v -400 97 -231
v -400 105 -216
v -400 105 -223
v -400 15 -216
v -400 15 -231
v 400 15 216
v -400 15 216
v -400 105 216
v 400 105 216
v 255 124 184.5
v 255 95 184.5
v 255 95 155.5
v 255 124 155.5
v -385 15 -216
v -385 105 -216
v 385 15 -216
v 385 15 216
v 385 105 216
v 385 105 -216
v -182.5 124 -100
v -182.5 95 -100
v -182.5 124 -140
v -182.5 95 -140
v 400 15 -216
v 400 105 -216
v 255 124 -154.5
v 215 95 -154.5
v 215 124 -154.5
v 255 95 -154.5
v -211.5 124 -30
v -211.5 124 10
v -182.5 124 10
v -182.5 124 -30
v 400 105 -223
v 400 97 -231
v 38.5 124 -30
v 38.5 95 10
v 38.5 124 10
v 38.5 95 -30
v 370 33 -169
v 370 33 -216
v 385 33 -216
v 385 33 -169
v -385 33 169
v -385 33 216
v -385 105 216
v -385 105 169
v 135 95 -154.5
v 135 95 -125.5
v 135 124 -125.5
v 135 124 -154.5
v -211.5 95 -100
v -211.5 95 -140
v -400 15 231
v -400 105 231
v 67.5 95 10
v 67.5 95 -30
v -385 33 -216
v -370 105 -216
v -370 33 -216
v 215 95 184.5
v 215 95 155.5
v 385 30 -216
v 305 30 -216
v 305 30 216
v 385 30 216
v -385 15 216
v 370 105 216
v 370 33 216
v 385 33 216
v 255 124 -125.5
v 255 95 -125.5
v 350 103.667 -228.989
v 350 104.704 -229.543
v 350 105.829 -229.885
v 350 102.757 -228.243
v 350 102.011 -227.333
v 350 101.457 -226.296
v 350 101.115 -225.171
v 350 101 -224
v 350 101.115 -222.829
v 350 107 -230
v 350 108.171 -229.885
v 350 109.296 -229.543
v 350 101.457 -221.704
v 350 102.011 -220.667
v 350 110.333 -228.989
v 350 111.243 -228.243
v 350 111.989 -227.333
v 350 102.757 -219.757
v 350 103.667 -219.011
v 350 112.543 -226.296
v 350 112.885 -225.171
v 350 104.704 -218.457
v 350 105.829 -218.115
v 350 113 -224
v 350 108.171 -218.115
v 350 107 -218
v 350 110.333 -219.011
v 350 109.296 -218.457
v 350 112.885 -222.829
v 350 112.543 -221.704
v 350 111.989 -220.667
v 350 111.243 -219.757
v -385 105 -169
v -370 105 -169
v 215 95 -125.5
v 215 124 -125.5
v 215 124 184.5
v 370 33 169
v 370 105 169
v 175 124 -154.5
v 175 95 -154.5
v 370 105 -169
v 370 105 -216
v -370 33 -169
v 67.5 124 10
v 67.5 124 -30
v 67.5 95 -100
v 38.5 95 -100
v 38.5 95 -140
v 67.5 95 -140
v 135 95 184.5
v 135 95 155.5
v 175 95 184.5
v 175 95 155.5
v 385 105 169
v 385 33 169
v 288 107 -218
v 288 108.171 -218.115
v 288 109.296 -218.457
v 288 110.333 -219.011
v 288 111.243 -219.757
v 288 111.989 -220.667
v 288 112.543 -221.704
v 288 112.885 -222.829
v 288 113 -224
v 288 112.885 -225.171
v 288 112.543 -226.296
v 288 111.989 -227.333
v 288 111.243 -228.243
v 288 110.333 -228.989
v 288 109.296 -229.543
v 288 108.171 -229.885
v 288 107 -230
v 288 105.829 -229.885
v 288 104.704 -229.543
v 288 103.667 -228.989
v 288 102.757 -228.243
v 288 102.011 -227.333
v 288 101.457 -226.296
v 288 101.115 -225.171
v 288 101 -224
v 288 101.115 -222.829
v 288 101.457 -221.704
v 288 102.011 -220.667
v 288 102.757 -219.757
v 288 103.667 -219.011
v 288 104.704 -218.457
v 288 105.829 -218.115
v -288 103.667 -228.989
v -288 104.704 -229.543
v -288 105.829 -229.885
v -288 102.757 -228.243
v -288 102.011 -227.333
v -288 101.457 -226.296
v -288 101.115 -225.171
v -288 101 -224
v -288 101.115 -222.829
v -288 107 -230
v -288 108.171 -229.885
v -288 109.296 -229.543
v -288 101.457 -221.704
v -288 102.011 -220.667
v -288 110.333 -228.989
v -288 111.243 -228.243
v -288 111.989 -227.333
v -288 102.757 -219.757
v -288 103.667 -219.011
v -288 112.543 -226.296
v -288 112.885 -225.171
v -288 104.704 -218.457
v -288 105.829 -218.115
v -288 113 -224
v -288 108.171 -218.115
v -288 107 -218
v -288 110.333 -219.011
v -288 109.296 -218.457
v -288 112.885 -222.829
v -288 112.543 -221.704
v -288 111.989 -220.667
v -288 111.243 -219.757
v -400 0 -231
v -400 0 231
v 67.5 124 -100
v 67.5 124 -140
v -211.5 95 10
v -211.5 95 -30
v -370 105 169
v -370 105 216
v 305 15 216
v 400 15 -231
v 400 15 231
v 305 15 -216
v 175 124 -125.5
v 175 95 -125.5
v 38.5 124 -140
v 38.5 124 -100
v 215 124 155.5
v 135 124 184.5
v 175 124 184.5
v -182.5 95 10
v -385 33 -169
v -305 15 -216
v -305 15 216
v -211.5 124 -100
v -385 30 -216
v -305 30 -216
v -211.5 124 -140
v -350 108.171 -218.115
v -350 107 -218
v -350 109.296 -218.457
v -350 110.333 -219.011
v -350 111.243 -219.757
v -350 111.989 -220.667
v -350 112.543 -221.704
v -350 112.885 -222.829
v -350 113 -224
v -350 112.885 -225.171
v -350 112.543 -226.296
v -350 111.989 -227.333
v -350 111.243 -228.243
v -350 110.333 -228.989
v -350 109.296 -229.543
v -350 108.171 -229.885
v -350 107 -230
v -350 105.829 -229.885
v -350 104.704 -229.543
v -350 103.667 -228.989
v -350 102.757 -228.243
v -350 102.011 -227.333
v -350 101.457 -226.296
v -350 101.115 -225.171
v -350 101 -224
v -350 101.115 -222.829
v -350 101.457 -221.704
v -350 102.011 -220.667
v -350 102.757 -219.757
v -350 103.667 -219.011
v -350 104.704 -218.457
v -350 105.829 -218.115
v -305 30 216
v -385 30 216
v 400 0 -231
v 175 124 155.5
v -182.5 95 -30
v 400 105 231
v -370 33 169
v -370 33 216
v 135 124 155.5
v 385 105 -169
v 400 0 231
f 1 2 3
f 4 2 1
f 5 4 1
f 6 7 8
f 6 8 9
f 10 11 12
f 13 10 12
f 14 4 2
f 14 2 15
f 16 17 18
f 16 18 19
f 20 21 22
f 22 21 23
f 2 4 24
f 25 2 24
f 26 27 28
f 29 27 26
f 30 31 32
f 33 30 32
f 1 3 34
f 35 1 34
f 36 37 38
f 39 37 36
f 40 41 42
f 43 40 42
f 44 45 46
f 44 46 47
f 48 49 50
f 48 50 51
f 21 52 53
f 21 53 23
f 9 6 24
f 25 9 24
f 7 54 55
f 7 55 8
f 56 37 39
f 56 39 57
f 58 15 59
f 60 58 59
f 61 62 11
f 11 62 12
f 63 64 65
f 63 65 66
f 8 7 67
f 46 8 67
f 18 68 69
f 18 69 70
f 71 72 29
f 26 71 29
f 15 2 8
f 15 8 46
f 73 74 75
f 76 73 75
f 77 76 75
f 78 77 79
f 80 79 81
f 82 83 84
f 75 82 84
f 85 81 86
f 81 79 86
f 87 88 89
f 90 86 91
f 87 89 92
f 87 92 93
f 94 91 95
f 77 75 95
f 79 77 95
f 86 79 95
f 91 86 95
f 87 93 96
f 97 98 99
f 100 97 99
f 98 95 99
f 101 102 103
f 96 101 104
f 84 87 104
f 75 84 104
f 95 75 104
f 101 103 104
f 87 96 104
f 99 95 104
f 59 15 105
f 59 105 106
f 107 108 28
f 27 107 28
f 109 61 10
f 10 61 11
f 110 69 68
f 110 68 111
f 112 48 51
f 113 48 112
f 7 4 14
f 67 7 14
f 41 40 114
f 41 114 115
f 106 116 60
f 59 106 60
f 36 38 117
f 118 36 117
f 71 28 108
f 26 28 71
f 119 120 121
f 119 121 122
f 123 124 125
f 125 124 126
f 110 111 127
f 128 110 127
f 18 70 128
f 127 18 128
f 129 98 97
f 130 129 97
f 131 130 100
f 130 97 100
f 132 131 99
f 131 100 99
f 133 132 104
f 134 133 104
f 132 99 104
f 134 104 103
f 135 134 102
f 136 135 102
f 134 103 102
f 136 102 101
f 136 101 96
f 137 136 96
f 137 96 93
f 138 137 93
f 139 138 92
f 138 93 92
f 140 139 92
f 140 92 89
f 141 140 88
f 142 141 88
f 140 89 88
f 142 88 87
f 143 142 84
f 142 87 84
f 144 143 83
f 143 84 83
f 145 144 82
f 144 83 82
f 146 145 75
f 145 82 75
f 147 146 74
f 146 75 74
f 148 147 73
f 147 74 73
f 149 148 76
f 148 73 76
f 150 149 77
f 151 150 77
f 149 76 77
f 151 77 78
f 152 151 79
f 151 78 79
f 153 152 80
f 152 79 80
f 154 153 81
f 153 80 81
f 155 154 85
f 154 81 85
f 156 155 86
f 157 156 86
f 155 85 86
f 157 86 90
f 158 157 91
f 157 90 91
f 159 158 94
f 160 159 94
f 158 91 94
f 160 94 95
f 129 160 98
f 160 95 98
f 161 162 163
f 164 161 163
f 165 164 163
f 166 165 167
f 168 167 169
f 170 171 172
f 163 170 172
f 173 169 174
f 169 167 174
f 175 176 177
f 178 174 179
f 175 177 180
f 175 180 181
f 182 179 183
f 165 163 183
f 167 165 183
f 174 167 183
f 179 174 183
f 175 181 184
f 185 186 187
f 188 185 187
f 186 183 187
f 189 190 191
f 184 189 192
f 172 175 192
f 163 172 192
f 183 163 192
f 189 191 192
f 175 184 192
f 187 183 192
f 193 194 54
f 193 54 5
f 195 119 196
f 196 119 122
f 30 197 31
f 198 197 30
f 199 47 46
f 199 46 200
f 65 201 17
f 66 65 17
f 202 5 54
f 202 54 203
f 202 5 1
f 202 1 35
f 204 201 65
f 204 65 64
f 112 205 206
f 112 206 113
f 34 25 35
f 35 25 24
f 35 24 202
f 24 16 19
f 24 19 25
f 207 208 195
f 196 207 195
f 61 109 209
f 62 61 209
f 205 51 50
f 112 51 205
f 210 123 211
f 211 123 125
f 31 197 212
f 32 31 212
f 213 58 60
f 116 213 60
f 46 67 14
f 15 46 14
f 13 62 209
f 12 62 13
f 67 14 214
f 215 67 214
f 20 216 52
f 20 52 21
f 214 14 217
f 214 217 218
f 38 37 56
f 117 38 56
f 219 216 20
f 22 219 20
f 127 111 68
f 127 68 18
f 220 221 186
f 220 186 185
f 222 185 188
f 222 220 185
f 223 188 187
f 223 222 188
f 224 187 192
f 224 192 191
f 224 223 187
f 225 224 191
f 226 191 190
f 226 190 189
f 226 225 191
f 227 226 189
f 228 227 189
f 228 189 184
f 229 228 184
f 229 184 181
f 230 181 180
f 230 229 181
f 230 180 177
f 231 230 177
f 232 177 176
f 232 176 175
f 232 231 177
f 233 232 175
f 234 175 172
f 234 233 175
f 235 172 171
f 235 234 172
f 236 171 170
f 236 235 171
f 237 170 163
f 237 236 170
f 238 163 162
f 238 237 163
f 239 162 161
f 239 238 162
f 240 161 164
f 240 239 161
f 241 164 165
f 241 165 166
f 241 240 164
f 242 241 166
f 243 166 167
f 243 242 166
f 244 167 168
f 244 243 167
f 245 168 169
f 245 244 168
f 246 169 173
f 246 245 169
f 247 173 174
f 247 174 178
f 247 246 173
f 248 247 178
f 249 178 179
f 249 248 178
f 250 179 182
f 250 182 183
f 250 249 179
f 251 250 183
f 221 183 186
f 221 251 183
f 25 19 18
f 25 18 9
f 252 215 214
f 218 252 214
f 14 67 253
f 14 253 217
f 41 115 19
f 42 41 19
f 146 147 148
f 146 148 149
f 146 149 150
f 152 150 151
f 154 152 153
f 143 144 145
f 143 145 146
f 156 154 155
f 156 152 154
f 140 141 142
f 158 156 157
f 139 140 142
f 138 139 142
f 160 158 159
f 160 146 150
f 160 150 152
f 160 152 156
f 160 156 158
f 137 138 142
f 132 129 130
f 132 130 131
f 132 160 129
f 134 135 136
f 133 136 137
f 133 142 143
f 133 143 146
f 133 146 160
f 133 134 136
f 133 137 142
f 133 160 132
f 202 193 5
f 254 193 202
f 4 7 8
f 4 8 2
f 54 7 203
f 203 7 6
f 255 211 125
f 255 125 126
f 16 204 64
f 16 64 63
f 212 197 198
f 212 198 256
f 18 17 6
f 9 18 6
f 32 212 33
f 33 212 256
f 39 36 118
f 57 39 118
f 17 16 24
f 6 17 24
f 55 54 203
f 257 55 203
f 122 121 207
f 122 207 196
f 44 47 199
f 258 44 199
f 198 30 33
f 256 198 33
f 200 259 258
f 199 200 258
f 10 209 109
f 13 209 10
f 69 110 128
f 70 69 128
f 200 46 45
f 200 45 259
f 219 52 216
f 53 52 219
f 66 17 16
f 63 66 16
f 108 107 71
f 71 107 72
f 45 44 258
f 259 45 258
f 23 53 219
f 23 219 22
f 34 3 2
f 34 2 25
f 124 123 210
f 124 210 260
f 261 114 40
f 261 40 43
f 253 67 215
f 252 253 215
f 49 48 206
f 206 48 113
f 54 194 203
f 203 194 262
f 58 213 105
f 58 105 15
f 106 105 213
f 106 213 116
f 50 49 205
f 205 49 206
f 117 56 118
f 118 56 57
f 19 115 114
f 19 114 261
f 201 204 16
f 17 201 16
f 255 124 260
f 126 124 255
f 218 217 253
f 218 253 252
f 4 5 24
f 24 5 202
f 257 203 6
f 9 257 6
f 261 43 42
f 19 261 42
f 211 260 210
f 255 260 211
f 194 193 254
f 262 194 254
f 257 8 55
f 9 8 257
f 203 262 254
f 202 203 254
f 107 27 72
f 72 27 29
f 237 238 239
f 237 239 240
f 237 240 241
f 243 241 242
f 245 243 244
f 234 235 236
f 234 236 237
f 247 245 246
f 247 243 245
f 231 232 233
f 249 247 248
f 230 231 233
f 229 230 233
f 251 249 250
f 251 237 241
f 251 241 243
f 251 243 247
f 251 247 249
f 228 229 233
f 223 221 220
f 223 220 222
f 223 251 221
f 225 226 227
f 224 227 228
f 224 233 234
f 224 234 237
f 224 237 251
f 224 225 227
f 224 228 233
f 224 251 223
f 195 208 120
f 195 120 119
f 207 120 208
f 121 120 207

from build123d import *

# Parameters (mm, degrees)
ESQUISSE1_W             = 800
ESQUISSE1_H             = 462
BOSS_EXTRU_1_DEPTH      = 15
ESQUISSE3_W             = 800
ESQUISSE3_H             = 15
BOSS_EXTRU_3_DEPTH      = 90
BOSS_EXTRU_3_2_DEPTH    = 90
ESQUISSE4_W             = 15
ESQUISSE4_H             = 432
BOSS_EXTRU_4_DEPTH      = 90
BOSS_EXTRU_4_2_DEPTH    = 90
ESQUISSE5_W             = 15
ESQUISSE5_H             = 47
BOSS_EXTRU_5_DEPTH      = 72
BOSS_EXTRU_5_2_DEPTH    = 72
BOSS_EXTRU_5_3_DEPTH    = 72
BOSS_EXTRU_5_4_DEPTH    = 72
ESQUISSE7_W             = 80
ESQUISSE7_H             = 432
BOSS_EXTRU_6_DEPTH      = 15
BOSS_EXTRU_6_2_DEPTH    = 15
BOSS_EXTRU_7_START      = -50
ESQUISSE8_R             = 6
BOSS_EXTRU_7_DEPTH      = 62
CHANFREIN1_SIZE         = 8
ESQUISSE9_W             = 120
ESQUISSE9_H             = 29
BOSS_EXTRU_8_DEPTH      = 29
BOSS_EXTRU_8_2_DEPTH    = 29
ESQUISSE9_W_2           = 29
ESQUISSE9_H_2           = 150
BOSS_EXTRU_8_3_DEPTH    = 29
BOSS_EXTRU_8_4_DEPTH    = 29
ESQUISSE10_W            = 279
ESQUISSE10_H            = 70
ESQUISSE10_W_2          = 40
ESQUISSE10_H_2          = 339
ENL_V_MAT_EXTRU_1_DEPTH = 479.264571132


with BuildPart() as part:
    # Esquisse1 → Boss.-Extru.1 (new body)
    with BuildSketch(Plane(origin=(0, 0, 0), x_dir=(1, 0, 0), z_dir=(0, 1, 0))):
        Rectangle(ESQUISSE1_W, ESQUISSE1_H)
    extrude(amount=BOSS_EXTRU_1_DEPTH)


with BuildPart() as body_2:
    # Esquisse3 → Boss.-Extru.3 (new body)
    with BuildSketch(Plane(origin=(0, 15, 0), x_dir=(1, 0, 0), z_dir=(0, 1, 0))):
        with Locations((0, 223.5)):
            Rectangle(ESQUISSE3_W, ESQUISSE3_H)
    extrude(amount=BOSS_EXTRU_3_DEPTH)

    # Chanfrein1
    chanfrein1_edges = [body_2.edges().sort_by_distance(p)[0] for p in [
        (0, 105, -231),
    ]]
    chamfer(chanfrein1_edges, length=CHANFREIN1_SIZE)


with BuildPart() as body_3:
    # Esquisse3 → Boss.-Extru.3 2 (new body)
    with BuildSketch(Plane(origin=(0, 15, 0), x_dir=(1, 0, 0), z_dir=(0, 1, 0))):
        with Locations((0, -223.5)):
            Rectangle(ESQUISSE3_W, ESQUISSE3_H)
    extrude(amount=BOSS_EXTRU_3_2_DEPTH)


with BuildPart() as body_4:
    # Esquisse4 → Boss.-Extru.4 (new body)
    with BuildSketch(Plane(origin=(0, 15, 0), x_dir=(1, 0, 0), z_dir=(0, 1, 0))):
        with Locations((-392.5, 0)):
            Rectangle(ESQUISSE4_W, ESQUISSE4_H)
    extrude(amount=BOSS_EXTRU_4_DEPTH)


with BuildPart() as body_5:
    # Esquisse4 → Boss.-Extru.4 2 (new body)
    with BuildSketch(Plane(origin=(0, 15, 0), x_dir=(1, 0, 0), z_dir=(0, 1, 0))):
        with Locations((392.5, 0)):
            Rectangle(ESQUISSE4_W, ESQUISSE4_H)
    extrude(amount=BOSS_EXTRU_4_2_DEPTH)


with BuildPart() as body_6:
    # Esquisse5 → Boss.-Extru.5 (new body)
    with BuildSketch(Plane(origin=(0, 105, 0), x_dir=(1, 0, 0), z_dir=(0, 1, 0))):
        with Locations((-377.5, 192.5)):
            Rectangle(ESQUISSE5_W, ESQUISSE5_H)
    extrude(amount=-BOSS_EXTRU_5_DEPTH)


with BuildPart() as body_7:
    # Esquisse5 → Boss.-Extru.5 2 (new body)
    with BuildSketch(Plane(origin=(0, 105, 0), x_dir=(1, 0, 0), z_dir=(0, 1, 0))):
        with Locations((-377.5, -192.5)):
            Rectangle(ESQUISSE5_W, ESQUISSE5_H)
    extrude(amount=-BOSS_EXTRU_5_2_DEPTH)


with BuildPart() as body_8:
    # Esquisse5 → Boss.-Extru.5 3 (new body)
    with BuildSketch(Plane(origin=(0, 105, 0), x_dir=(1, 0, 0), z_dir=(0, 1, 0))):
        with Locations((377.5, -192.5)):
            Rectangle(ESQUISSE5_W, ESQUISSE5_H)
    extrude(amount=-BOSS_EXTRU_5_3_DEPTH)


with BuildPart() as body_9:
    # Esquisse5 → Boss.-Extru.5 4 (new body)
    with BuildSketch(Plane(origin=(0, 105, 0), x_dir=(1, 0, 0), z_dir=(0, 1, 0))):
        with Locations((377.5, 192.5)):
            Rectangle(ESQUISSE5_W, ESQUISSE5_H)
    extrude(amount=-BOSS_EXTRU_5_4_DEPTH)


with BuildPart() as body_10:
    # Esquisse7 → Boss.-Extru.6 (new body)
    with BuildSketch(Plane(origin=(0, 15, 0), x_dir=(1, 0, 0), z_dir=(0, 1, 0))):
        with Locations((-345, 0)):
            Rectangle(ESQUISSE7_W, ESQUISSE7_H)
    extrude(amount=BOSS_EXTRU_6_DEPTH)


with BuildPart() as body_11:
    # Esquisse7 → Boss.-Extru.6 2 (new body)
    with BuildSketch(Plane(origin=(0, 15, 0), x_dir=(1, 0, 0), z_dir=(0, 1, 0))):
        with Locations((345, 0)):
            Rectangle(ESQUISSE7_W, ESQUISSE7_H)
    extrude(amount=BOSS_EXTRU_6_2_DEPTH)


with BuildPart() as body_12:
    # Esquisse8 → Boss.-Extru.7 (new body)
    with BuildSketch(Plane.ZY.offset(400).offset(BOSS_EXTRU_7_START)):
        with Locations((-224, 107)):
            Circle(ESQUISSE8_R)
    extrude(amount=-BOSS_EXTRU_7_DEPTH)


with BuildPart() as body_13:
    # Symétrie3: mirrored copy
    add(body_12.part.mirror(Plane(origin=(0, 0, 0), x_dir=(0, 0, 1), z_dir=(1, 0, 0))))


with BuildPart() as body_14:
    # Esquisse9 → Boss.-Extru.8 (new body)
    with BuildSketch(Plane(origin=(0, 15, 0), x_dir=(1, 0, 0), z_dir=(0, 1, 0))):
        with Locations((195, 140)):
            Rectangle(ESQUISSE9_W, ESQUISSE9_H)
    extrude(amount=BOSS_EXTRU_8_DEPTH)


with BuildPart() as body_15:
    # Esquisse9 → Boss.-Extru.8 2 (new body)
    with BuildSketch(Plane(origin=(0, 15, 0), x_dir=(1, 0, 0), z_dir=(0, 1, 0))):
        with Locations((195, -170)):
            Rectangle(ESQUISSE9_W, ESQUISSE9_H)
    extrude(amount=BOSS_EXTRU_8_2_DEPTH)


with BuildPart() as body_16:
    # Esquisse9 → Boss.-Extru.8 3 (new body)
    with BuildSketch(Plane(origin=(0, 15, 0), x_dir=(1, 0, 0), z_dir=(0, 1, 0))):
        with Locations((-197, 65)):
            Rectangle(ESQUISSE9_W_2, ESQUISSE9_H_2)
    extrude(amount=BOSS_EXTRU_8_3_DEPTH)


with BuildPart() as body_17:
    # Esquisse9 → Boss.-Extru.8 4 (new body)
    with BuildSketch(Plane(origin=(0, 15, 0), x_dir=(1, 0, 0), z_dir=(0, 1, 0))):
        with Locations((53, 65)):
            Rectangle(ESQUISSE9_W_2, ESQUISSE9_H_2)
    extrude(amount=BOSS_EXTRU_8_4_DEPTH)


with BuildPart() as body_15_1:
    # Corps-Déplacer/Copier1: moved
    add(body_15.part.moved(Location((0, 80, 0))))


with BuildPart() as body_14_1:
    # Corps-Déplacer/Copier1: moved
    add(body_14.part.moved(Location((0, 80, 0))))


with BuildPart() as body_17_1:
    # Corps-Déplacer/Copier1: moved
    add(body_17.part.moved(Location((0, 80, 0))))


with BuildPart() as body_16_1:
    # Corps-Déplacer/Copier1: moved
    add(body_16.part.moved(Location((0, 80, 0))))


with BuildPart() as enl_v_mat_extru_1_tool:
    # Esquisse10 → Enlèv. mat.-Extru.1 (new, through all)
    with BuildSketch(Plane(origin=(0, 124, 0), x_dir=(1, 0, 0), z_dir=(0, 1, 0))):
        with Locations((-72, 65)):
            Rectangle(ESQUISSE10_W, ESQUISSE10_H)
        with Locations((195, -15)):
            Rectangle(ESQUISSE10_W_2, ESQUISSE10_H_2)
    extrude(amount=-ENL_V_MAT_EXTRU_1_DEPTH)


with BuildPart() as body_17_2:
    add(body_17_1.part)

    # Enlèv. mat.-Extru.1: cut by enl_v_mat_extru_1_tool
    add(enl_v_mat_extru_1_tool.part, mode=Mode.SUBTRACT)


with BuildPart() as body_16_2:
    add(body_16_1.part)

    # Enlèv. mat.-Extru.1: cut by enl_v_mat_extru_1_tool
    add(enl_v_mat_extru_1_tool.part, mode=Mode.SUBTRACT)


with BuildPart() as body_14_2:
    add(body_14_1.part)

    # Enlèv. mat.-Extru.1: cut by enl_v_mat_extru_1_tool
    add(enl_v_mat_extru_1_tool.part, mode=Mode.SUBTRACT)


with BuildPart() as body_15_2:
    add(body_15_1.part)

    # Enlèv. mat.-Extru.1: cut by enl_v_mat_extru_1_tool
    add(enl_v_mat_extru_1_tool.part, mode=Mode.SUBTRACT)


with BuildPart() as enl_v_mat_extru_1_piece_1:
    # of the separate pieces the step leaves, piece 1, a body of its own (enl_v_mat_extru_1_pieces)
    add(body_14_2.part.solids().sort_by_distance((135, 95, -154.5))[0])


with BuildPart() as enl_v_mat_extru_1_piece_2:
    # of the separate pieces the step leaves, piece 2, a body of its own (enl_v_mat_extru_1_pieces)
    add(body_14_2.part.solids().sort_by_distance((215, 95, -154.5))[0])


with BuildPart() as enl_v_mat_extru_1_piece_1_of_body_15:
    # of the separate pieces the step leaves, piece 1, a body of its own (enl_v_mat_extru_1_pieces_of_body_15)
    add(body_15_2.part.solids().sort_by_distance((135, 95, 184.5))[0])


with BuildPart() as enl_v_mat_extru_1_piece_2_of_body_15:
    # of the separate pieces the step leaves, piece 2, a body of its own (enl_v_mat_extru_1_pieces_of_body_15)
    add(body_15_2.part.solids().sort_by_distance((255, 95, 184.5))[0])


with BuildPart() as enl_v_mat_extru_1_piece_1_of_body_16:
    # of the separate pieces the step leaves, piece 1, a body of its own (enl_v_mat_extru_1_pieces_of_body_16)
    add(body_16_2.part.solids().sort_by_distance((-211.5, 95, -140))[0])


with BuildPart() as enl_v_mat_extru_1_piece_2_of_body_16:
    # of the separate pieces the step leaves, piece 2, a body of its own (enl_v_mat_extru_1_pieces_of_body_16)
    add(body_16_2.part.solids().sort_by_distance((-211.5, 95, 10))[0])


with BuildPart() as enl_v_mat_extru_1_piece_1_of_body_17:
    # of the separate pieces the step leaves, piece 1, a body of its own (enl_v_mat_extru_1_pieces_of_body_17)
    add(body_17_2.part.solids().sort_by_distance((38.5, 95, -140))[0])


with BuildPart() as enl_v_mat_extru_1_piece_2_of_body_17:
    # of the separate pieces the step leaves, piece 2, a body of its own (enl_v_mat_extru_1_pieces_of_body_17)
    add(body_17_2.part.solids().sort_by_distance((38.5, 95, -30))[0])


solid = Compound([part.part, body_2.part, body_3.part, body_4.part, body_5.part, body_6.part, body_7.part, body_8.part, body_9.part, body_10.part, body_11.part, body_12.part, body_13.part, enl_v_mat_extru_1_piece_1.part, enl_v_mat_extru_1_piece_2.part, enl_v_mat_extru_1_piece_1_of_body_15.part, enl_v_mat_extru_1_piece_2_of_body_15.part, enl_v_mat_extru_1_piece_1_of_body_16.part, enl_v_mat_extru_1_piece_2_of_body_16.part, enl_v_mat_extru_1_piece_1_of_body_17.part, enl_v_mat_extru_1_piece_2_of_body_17.part])
